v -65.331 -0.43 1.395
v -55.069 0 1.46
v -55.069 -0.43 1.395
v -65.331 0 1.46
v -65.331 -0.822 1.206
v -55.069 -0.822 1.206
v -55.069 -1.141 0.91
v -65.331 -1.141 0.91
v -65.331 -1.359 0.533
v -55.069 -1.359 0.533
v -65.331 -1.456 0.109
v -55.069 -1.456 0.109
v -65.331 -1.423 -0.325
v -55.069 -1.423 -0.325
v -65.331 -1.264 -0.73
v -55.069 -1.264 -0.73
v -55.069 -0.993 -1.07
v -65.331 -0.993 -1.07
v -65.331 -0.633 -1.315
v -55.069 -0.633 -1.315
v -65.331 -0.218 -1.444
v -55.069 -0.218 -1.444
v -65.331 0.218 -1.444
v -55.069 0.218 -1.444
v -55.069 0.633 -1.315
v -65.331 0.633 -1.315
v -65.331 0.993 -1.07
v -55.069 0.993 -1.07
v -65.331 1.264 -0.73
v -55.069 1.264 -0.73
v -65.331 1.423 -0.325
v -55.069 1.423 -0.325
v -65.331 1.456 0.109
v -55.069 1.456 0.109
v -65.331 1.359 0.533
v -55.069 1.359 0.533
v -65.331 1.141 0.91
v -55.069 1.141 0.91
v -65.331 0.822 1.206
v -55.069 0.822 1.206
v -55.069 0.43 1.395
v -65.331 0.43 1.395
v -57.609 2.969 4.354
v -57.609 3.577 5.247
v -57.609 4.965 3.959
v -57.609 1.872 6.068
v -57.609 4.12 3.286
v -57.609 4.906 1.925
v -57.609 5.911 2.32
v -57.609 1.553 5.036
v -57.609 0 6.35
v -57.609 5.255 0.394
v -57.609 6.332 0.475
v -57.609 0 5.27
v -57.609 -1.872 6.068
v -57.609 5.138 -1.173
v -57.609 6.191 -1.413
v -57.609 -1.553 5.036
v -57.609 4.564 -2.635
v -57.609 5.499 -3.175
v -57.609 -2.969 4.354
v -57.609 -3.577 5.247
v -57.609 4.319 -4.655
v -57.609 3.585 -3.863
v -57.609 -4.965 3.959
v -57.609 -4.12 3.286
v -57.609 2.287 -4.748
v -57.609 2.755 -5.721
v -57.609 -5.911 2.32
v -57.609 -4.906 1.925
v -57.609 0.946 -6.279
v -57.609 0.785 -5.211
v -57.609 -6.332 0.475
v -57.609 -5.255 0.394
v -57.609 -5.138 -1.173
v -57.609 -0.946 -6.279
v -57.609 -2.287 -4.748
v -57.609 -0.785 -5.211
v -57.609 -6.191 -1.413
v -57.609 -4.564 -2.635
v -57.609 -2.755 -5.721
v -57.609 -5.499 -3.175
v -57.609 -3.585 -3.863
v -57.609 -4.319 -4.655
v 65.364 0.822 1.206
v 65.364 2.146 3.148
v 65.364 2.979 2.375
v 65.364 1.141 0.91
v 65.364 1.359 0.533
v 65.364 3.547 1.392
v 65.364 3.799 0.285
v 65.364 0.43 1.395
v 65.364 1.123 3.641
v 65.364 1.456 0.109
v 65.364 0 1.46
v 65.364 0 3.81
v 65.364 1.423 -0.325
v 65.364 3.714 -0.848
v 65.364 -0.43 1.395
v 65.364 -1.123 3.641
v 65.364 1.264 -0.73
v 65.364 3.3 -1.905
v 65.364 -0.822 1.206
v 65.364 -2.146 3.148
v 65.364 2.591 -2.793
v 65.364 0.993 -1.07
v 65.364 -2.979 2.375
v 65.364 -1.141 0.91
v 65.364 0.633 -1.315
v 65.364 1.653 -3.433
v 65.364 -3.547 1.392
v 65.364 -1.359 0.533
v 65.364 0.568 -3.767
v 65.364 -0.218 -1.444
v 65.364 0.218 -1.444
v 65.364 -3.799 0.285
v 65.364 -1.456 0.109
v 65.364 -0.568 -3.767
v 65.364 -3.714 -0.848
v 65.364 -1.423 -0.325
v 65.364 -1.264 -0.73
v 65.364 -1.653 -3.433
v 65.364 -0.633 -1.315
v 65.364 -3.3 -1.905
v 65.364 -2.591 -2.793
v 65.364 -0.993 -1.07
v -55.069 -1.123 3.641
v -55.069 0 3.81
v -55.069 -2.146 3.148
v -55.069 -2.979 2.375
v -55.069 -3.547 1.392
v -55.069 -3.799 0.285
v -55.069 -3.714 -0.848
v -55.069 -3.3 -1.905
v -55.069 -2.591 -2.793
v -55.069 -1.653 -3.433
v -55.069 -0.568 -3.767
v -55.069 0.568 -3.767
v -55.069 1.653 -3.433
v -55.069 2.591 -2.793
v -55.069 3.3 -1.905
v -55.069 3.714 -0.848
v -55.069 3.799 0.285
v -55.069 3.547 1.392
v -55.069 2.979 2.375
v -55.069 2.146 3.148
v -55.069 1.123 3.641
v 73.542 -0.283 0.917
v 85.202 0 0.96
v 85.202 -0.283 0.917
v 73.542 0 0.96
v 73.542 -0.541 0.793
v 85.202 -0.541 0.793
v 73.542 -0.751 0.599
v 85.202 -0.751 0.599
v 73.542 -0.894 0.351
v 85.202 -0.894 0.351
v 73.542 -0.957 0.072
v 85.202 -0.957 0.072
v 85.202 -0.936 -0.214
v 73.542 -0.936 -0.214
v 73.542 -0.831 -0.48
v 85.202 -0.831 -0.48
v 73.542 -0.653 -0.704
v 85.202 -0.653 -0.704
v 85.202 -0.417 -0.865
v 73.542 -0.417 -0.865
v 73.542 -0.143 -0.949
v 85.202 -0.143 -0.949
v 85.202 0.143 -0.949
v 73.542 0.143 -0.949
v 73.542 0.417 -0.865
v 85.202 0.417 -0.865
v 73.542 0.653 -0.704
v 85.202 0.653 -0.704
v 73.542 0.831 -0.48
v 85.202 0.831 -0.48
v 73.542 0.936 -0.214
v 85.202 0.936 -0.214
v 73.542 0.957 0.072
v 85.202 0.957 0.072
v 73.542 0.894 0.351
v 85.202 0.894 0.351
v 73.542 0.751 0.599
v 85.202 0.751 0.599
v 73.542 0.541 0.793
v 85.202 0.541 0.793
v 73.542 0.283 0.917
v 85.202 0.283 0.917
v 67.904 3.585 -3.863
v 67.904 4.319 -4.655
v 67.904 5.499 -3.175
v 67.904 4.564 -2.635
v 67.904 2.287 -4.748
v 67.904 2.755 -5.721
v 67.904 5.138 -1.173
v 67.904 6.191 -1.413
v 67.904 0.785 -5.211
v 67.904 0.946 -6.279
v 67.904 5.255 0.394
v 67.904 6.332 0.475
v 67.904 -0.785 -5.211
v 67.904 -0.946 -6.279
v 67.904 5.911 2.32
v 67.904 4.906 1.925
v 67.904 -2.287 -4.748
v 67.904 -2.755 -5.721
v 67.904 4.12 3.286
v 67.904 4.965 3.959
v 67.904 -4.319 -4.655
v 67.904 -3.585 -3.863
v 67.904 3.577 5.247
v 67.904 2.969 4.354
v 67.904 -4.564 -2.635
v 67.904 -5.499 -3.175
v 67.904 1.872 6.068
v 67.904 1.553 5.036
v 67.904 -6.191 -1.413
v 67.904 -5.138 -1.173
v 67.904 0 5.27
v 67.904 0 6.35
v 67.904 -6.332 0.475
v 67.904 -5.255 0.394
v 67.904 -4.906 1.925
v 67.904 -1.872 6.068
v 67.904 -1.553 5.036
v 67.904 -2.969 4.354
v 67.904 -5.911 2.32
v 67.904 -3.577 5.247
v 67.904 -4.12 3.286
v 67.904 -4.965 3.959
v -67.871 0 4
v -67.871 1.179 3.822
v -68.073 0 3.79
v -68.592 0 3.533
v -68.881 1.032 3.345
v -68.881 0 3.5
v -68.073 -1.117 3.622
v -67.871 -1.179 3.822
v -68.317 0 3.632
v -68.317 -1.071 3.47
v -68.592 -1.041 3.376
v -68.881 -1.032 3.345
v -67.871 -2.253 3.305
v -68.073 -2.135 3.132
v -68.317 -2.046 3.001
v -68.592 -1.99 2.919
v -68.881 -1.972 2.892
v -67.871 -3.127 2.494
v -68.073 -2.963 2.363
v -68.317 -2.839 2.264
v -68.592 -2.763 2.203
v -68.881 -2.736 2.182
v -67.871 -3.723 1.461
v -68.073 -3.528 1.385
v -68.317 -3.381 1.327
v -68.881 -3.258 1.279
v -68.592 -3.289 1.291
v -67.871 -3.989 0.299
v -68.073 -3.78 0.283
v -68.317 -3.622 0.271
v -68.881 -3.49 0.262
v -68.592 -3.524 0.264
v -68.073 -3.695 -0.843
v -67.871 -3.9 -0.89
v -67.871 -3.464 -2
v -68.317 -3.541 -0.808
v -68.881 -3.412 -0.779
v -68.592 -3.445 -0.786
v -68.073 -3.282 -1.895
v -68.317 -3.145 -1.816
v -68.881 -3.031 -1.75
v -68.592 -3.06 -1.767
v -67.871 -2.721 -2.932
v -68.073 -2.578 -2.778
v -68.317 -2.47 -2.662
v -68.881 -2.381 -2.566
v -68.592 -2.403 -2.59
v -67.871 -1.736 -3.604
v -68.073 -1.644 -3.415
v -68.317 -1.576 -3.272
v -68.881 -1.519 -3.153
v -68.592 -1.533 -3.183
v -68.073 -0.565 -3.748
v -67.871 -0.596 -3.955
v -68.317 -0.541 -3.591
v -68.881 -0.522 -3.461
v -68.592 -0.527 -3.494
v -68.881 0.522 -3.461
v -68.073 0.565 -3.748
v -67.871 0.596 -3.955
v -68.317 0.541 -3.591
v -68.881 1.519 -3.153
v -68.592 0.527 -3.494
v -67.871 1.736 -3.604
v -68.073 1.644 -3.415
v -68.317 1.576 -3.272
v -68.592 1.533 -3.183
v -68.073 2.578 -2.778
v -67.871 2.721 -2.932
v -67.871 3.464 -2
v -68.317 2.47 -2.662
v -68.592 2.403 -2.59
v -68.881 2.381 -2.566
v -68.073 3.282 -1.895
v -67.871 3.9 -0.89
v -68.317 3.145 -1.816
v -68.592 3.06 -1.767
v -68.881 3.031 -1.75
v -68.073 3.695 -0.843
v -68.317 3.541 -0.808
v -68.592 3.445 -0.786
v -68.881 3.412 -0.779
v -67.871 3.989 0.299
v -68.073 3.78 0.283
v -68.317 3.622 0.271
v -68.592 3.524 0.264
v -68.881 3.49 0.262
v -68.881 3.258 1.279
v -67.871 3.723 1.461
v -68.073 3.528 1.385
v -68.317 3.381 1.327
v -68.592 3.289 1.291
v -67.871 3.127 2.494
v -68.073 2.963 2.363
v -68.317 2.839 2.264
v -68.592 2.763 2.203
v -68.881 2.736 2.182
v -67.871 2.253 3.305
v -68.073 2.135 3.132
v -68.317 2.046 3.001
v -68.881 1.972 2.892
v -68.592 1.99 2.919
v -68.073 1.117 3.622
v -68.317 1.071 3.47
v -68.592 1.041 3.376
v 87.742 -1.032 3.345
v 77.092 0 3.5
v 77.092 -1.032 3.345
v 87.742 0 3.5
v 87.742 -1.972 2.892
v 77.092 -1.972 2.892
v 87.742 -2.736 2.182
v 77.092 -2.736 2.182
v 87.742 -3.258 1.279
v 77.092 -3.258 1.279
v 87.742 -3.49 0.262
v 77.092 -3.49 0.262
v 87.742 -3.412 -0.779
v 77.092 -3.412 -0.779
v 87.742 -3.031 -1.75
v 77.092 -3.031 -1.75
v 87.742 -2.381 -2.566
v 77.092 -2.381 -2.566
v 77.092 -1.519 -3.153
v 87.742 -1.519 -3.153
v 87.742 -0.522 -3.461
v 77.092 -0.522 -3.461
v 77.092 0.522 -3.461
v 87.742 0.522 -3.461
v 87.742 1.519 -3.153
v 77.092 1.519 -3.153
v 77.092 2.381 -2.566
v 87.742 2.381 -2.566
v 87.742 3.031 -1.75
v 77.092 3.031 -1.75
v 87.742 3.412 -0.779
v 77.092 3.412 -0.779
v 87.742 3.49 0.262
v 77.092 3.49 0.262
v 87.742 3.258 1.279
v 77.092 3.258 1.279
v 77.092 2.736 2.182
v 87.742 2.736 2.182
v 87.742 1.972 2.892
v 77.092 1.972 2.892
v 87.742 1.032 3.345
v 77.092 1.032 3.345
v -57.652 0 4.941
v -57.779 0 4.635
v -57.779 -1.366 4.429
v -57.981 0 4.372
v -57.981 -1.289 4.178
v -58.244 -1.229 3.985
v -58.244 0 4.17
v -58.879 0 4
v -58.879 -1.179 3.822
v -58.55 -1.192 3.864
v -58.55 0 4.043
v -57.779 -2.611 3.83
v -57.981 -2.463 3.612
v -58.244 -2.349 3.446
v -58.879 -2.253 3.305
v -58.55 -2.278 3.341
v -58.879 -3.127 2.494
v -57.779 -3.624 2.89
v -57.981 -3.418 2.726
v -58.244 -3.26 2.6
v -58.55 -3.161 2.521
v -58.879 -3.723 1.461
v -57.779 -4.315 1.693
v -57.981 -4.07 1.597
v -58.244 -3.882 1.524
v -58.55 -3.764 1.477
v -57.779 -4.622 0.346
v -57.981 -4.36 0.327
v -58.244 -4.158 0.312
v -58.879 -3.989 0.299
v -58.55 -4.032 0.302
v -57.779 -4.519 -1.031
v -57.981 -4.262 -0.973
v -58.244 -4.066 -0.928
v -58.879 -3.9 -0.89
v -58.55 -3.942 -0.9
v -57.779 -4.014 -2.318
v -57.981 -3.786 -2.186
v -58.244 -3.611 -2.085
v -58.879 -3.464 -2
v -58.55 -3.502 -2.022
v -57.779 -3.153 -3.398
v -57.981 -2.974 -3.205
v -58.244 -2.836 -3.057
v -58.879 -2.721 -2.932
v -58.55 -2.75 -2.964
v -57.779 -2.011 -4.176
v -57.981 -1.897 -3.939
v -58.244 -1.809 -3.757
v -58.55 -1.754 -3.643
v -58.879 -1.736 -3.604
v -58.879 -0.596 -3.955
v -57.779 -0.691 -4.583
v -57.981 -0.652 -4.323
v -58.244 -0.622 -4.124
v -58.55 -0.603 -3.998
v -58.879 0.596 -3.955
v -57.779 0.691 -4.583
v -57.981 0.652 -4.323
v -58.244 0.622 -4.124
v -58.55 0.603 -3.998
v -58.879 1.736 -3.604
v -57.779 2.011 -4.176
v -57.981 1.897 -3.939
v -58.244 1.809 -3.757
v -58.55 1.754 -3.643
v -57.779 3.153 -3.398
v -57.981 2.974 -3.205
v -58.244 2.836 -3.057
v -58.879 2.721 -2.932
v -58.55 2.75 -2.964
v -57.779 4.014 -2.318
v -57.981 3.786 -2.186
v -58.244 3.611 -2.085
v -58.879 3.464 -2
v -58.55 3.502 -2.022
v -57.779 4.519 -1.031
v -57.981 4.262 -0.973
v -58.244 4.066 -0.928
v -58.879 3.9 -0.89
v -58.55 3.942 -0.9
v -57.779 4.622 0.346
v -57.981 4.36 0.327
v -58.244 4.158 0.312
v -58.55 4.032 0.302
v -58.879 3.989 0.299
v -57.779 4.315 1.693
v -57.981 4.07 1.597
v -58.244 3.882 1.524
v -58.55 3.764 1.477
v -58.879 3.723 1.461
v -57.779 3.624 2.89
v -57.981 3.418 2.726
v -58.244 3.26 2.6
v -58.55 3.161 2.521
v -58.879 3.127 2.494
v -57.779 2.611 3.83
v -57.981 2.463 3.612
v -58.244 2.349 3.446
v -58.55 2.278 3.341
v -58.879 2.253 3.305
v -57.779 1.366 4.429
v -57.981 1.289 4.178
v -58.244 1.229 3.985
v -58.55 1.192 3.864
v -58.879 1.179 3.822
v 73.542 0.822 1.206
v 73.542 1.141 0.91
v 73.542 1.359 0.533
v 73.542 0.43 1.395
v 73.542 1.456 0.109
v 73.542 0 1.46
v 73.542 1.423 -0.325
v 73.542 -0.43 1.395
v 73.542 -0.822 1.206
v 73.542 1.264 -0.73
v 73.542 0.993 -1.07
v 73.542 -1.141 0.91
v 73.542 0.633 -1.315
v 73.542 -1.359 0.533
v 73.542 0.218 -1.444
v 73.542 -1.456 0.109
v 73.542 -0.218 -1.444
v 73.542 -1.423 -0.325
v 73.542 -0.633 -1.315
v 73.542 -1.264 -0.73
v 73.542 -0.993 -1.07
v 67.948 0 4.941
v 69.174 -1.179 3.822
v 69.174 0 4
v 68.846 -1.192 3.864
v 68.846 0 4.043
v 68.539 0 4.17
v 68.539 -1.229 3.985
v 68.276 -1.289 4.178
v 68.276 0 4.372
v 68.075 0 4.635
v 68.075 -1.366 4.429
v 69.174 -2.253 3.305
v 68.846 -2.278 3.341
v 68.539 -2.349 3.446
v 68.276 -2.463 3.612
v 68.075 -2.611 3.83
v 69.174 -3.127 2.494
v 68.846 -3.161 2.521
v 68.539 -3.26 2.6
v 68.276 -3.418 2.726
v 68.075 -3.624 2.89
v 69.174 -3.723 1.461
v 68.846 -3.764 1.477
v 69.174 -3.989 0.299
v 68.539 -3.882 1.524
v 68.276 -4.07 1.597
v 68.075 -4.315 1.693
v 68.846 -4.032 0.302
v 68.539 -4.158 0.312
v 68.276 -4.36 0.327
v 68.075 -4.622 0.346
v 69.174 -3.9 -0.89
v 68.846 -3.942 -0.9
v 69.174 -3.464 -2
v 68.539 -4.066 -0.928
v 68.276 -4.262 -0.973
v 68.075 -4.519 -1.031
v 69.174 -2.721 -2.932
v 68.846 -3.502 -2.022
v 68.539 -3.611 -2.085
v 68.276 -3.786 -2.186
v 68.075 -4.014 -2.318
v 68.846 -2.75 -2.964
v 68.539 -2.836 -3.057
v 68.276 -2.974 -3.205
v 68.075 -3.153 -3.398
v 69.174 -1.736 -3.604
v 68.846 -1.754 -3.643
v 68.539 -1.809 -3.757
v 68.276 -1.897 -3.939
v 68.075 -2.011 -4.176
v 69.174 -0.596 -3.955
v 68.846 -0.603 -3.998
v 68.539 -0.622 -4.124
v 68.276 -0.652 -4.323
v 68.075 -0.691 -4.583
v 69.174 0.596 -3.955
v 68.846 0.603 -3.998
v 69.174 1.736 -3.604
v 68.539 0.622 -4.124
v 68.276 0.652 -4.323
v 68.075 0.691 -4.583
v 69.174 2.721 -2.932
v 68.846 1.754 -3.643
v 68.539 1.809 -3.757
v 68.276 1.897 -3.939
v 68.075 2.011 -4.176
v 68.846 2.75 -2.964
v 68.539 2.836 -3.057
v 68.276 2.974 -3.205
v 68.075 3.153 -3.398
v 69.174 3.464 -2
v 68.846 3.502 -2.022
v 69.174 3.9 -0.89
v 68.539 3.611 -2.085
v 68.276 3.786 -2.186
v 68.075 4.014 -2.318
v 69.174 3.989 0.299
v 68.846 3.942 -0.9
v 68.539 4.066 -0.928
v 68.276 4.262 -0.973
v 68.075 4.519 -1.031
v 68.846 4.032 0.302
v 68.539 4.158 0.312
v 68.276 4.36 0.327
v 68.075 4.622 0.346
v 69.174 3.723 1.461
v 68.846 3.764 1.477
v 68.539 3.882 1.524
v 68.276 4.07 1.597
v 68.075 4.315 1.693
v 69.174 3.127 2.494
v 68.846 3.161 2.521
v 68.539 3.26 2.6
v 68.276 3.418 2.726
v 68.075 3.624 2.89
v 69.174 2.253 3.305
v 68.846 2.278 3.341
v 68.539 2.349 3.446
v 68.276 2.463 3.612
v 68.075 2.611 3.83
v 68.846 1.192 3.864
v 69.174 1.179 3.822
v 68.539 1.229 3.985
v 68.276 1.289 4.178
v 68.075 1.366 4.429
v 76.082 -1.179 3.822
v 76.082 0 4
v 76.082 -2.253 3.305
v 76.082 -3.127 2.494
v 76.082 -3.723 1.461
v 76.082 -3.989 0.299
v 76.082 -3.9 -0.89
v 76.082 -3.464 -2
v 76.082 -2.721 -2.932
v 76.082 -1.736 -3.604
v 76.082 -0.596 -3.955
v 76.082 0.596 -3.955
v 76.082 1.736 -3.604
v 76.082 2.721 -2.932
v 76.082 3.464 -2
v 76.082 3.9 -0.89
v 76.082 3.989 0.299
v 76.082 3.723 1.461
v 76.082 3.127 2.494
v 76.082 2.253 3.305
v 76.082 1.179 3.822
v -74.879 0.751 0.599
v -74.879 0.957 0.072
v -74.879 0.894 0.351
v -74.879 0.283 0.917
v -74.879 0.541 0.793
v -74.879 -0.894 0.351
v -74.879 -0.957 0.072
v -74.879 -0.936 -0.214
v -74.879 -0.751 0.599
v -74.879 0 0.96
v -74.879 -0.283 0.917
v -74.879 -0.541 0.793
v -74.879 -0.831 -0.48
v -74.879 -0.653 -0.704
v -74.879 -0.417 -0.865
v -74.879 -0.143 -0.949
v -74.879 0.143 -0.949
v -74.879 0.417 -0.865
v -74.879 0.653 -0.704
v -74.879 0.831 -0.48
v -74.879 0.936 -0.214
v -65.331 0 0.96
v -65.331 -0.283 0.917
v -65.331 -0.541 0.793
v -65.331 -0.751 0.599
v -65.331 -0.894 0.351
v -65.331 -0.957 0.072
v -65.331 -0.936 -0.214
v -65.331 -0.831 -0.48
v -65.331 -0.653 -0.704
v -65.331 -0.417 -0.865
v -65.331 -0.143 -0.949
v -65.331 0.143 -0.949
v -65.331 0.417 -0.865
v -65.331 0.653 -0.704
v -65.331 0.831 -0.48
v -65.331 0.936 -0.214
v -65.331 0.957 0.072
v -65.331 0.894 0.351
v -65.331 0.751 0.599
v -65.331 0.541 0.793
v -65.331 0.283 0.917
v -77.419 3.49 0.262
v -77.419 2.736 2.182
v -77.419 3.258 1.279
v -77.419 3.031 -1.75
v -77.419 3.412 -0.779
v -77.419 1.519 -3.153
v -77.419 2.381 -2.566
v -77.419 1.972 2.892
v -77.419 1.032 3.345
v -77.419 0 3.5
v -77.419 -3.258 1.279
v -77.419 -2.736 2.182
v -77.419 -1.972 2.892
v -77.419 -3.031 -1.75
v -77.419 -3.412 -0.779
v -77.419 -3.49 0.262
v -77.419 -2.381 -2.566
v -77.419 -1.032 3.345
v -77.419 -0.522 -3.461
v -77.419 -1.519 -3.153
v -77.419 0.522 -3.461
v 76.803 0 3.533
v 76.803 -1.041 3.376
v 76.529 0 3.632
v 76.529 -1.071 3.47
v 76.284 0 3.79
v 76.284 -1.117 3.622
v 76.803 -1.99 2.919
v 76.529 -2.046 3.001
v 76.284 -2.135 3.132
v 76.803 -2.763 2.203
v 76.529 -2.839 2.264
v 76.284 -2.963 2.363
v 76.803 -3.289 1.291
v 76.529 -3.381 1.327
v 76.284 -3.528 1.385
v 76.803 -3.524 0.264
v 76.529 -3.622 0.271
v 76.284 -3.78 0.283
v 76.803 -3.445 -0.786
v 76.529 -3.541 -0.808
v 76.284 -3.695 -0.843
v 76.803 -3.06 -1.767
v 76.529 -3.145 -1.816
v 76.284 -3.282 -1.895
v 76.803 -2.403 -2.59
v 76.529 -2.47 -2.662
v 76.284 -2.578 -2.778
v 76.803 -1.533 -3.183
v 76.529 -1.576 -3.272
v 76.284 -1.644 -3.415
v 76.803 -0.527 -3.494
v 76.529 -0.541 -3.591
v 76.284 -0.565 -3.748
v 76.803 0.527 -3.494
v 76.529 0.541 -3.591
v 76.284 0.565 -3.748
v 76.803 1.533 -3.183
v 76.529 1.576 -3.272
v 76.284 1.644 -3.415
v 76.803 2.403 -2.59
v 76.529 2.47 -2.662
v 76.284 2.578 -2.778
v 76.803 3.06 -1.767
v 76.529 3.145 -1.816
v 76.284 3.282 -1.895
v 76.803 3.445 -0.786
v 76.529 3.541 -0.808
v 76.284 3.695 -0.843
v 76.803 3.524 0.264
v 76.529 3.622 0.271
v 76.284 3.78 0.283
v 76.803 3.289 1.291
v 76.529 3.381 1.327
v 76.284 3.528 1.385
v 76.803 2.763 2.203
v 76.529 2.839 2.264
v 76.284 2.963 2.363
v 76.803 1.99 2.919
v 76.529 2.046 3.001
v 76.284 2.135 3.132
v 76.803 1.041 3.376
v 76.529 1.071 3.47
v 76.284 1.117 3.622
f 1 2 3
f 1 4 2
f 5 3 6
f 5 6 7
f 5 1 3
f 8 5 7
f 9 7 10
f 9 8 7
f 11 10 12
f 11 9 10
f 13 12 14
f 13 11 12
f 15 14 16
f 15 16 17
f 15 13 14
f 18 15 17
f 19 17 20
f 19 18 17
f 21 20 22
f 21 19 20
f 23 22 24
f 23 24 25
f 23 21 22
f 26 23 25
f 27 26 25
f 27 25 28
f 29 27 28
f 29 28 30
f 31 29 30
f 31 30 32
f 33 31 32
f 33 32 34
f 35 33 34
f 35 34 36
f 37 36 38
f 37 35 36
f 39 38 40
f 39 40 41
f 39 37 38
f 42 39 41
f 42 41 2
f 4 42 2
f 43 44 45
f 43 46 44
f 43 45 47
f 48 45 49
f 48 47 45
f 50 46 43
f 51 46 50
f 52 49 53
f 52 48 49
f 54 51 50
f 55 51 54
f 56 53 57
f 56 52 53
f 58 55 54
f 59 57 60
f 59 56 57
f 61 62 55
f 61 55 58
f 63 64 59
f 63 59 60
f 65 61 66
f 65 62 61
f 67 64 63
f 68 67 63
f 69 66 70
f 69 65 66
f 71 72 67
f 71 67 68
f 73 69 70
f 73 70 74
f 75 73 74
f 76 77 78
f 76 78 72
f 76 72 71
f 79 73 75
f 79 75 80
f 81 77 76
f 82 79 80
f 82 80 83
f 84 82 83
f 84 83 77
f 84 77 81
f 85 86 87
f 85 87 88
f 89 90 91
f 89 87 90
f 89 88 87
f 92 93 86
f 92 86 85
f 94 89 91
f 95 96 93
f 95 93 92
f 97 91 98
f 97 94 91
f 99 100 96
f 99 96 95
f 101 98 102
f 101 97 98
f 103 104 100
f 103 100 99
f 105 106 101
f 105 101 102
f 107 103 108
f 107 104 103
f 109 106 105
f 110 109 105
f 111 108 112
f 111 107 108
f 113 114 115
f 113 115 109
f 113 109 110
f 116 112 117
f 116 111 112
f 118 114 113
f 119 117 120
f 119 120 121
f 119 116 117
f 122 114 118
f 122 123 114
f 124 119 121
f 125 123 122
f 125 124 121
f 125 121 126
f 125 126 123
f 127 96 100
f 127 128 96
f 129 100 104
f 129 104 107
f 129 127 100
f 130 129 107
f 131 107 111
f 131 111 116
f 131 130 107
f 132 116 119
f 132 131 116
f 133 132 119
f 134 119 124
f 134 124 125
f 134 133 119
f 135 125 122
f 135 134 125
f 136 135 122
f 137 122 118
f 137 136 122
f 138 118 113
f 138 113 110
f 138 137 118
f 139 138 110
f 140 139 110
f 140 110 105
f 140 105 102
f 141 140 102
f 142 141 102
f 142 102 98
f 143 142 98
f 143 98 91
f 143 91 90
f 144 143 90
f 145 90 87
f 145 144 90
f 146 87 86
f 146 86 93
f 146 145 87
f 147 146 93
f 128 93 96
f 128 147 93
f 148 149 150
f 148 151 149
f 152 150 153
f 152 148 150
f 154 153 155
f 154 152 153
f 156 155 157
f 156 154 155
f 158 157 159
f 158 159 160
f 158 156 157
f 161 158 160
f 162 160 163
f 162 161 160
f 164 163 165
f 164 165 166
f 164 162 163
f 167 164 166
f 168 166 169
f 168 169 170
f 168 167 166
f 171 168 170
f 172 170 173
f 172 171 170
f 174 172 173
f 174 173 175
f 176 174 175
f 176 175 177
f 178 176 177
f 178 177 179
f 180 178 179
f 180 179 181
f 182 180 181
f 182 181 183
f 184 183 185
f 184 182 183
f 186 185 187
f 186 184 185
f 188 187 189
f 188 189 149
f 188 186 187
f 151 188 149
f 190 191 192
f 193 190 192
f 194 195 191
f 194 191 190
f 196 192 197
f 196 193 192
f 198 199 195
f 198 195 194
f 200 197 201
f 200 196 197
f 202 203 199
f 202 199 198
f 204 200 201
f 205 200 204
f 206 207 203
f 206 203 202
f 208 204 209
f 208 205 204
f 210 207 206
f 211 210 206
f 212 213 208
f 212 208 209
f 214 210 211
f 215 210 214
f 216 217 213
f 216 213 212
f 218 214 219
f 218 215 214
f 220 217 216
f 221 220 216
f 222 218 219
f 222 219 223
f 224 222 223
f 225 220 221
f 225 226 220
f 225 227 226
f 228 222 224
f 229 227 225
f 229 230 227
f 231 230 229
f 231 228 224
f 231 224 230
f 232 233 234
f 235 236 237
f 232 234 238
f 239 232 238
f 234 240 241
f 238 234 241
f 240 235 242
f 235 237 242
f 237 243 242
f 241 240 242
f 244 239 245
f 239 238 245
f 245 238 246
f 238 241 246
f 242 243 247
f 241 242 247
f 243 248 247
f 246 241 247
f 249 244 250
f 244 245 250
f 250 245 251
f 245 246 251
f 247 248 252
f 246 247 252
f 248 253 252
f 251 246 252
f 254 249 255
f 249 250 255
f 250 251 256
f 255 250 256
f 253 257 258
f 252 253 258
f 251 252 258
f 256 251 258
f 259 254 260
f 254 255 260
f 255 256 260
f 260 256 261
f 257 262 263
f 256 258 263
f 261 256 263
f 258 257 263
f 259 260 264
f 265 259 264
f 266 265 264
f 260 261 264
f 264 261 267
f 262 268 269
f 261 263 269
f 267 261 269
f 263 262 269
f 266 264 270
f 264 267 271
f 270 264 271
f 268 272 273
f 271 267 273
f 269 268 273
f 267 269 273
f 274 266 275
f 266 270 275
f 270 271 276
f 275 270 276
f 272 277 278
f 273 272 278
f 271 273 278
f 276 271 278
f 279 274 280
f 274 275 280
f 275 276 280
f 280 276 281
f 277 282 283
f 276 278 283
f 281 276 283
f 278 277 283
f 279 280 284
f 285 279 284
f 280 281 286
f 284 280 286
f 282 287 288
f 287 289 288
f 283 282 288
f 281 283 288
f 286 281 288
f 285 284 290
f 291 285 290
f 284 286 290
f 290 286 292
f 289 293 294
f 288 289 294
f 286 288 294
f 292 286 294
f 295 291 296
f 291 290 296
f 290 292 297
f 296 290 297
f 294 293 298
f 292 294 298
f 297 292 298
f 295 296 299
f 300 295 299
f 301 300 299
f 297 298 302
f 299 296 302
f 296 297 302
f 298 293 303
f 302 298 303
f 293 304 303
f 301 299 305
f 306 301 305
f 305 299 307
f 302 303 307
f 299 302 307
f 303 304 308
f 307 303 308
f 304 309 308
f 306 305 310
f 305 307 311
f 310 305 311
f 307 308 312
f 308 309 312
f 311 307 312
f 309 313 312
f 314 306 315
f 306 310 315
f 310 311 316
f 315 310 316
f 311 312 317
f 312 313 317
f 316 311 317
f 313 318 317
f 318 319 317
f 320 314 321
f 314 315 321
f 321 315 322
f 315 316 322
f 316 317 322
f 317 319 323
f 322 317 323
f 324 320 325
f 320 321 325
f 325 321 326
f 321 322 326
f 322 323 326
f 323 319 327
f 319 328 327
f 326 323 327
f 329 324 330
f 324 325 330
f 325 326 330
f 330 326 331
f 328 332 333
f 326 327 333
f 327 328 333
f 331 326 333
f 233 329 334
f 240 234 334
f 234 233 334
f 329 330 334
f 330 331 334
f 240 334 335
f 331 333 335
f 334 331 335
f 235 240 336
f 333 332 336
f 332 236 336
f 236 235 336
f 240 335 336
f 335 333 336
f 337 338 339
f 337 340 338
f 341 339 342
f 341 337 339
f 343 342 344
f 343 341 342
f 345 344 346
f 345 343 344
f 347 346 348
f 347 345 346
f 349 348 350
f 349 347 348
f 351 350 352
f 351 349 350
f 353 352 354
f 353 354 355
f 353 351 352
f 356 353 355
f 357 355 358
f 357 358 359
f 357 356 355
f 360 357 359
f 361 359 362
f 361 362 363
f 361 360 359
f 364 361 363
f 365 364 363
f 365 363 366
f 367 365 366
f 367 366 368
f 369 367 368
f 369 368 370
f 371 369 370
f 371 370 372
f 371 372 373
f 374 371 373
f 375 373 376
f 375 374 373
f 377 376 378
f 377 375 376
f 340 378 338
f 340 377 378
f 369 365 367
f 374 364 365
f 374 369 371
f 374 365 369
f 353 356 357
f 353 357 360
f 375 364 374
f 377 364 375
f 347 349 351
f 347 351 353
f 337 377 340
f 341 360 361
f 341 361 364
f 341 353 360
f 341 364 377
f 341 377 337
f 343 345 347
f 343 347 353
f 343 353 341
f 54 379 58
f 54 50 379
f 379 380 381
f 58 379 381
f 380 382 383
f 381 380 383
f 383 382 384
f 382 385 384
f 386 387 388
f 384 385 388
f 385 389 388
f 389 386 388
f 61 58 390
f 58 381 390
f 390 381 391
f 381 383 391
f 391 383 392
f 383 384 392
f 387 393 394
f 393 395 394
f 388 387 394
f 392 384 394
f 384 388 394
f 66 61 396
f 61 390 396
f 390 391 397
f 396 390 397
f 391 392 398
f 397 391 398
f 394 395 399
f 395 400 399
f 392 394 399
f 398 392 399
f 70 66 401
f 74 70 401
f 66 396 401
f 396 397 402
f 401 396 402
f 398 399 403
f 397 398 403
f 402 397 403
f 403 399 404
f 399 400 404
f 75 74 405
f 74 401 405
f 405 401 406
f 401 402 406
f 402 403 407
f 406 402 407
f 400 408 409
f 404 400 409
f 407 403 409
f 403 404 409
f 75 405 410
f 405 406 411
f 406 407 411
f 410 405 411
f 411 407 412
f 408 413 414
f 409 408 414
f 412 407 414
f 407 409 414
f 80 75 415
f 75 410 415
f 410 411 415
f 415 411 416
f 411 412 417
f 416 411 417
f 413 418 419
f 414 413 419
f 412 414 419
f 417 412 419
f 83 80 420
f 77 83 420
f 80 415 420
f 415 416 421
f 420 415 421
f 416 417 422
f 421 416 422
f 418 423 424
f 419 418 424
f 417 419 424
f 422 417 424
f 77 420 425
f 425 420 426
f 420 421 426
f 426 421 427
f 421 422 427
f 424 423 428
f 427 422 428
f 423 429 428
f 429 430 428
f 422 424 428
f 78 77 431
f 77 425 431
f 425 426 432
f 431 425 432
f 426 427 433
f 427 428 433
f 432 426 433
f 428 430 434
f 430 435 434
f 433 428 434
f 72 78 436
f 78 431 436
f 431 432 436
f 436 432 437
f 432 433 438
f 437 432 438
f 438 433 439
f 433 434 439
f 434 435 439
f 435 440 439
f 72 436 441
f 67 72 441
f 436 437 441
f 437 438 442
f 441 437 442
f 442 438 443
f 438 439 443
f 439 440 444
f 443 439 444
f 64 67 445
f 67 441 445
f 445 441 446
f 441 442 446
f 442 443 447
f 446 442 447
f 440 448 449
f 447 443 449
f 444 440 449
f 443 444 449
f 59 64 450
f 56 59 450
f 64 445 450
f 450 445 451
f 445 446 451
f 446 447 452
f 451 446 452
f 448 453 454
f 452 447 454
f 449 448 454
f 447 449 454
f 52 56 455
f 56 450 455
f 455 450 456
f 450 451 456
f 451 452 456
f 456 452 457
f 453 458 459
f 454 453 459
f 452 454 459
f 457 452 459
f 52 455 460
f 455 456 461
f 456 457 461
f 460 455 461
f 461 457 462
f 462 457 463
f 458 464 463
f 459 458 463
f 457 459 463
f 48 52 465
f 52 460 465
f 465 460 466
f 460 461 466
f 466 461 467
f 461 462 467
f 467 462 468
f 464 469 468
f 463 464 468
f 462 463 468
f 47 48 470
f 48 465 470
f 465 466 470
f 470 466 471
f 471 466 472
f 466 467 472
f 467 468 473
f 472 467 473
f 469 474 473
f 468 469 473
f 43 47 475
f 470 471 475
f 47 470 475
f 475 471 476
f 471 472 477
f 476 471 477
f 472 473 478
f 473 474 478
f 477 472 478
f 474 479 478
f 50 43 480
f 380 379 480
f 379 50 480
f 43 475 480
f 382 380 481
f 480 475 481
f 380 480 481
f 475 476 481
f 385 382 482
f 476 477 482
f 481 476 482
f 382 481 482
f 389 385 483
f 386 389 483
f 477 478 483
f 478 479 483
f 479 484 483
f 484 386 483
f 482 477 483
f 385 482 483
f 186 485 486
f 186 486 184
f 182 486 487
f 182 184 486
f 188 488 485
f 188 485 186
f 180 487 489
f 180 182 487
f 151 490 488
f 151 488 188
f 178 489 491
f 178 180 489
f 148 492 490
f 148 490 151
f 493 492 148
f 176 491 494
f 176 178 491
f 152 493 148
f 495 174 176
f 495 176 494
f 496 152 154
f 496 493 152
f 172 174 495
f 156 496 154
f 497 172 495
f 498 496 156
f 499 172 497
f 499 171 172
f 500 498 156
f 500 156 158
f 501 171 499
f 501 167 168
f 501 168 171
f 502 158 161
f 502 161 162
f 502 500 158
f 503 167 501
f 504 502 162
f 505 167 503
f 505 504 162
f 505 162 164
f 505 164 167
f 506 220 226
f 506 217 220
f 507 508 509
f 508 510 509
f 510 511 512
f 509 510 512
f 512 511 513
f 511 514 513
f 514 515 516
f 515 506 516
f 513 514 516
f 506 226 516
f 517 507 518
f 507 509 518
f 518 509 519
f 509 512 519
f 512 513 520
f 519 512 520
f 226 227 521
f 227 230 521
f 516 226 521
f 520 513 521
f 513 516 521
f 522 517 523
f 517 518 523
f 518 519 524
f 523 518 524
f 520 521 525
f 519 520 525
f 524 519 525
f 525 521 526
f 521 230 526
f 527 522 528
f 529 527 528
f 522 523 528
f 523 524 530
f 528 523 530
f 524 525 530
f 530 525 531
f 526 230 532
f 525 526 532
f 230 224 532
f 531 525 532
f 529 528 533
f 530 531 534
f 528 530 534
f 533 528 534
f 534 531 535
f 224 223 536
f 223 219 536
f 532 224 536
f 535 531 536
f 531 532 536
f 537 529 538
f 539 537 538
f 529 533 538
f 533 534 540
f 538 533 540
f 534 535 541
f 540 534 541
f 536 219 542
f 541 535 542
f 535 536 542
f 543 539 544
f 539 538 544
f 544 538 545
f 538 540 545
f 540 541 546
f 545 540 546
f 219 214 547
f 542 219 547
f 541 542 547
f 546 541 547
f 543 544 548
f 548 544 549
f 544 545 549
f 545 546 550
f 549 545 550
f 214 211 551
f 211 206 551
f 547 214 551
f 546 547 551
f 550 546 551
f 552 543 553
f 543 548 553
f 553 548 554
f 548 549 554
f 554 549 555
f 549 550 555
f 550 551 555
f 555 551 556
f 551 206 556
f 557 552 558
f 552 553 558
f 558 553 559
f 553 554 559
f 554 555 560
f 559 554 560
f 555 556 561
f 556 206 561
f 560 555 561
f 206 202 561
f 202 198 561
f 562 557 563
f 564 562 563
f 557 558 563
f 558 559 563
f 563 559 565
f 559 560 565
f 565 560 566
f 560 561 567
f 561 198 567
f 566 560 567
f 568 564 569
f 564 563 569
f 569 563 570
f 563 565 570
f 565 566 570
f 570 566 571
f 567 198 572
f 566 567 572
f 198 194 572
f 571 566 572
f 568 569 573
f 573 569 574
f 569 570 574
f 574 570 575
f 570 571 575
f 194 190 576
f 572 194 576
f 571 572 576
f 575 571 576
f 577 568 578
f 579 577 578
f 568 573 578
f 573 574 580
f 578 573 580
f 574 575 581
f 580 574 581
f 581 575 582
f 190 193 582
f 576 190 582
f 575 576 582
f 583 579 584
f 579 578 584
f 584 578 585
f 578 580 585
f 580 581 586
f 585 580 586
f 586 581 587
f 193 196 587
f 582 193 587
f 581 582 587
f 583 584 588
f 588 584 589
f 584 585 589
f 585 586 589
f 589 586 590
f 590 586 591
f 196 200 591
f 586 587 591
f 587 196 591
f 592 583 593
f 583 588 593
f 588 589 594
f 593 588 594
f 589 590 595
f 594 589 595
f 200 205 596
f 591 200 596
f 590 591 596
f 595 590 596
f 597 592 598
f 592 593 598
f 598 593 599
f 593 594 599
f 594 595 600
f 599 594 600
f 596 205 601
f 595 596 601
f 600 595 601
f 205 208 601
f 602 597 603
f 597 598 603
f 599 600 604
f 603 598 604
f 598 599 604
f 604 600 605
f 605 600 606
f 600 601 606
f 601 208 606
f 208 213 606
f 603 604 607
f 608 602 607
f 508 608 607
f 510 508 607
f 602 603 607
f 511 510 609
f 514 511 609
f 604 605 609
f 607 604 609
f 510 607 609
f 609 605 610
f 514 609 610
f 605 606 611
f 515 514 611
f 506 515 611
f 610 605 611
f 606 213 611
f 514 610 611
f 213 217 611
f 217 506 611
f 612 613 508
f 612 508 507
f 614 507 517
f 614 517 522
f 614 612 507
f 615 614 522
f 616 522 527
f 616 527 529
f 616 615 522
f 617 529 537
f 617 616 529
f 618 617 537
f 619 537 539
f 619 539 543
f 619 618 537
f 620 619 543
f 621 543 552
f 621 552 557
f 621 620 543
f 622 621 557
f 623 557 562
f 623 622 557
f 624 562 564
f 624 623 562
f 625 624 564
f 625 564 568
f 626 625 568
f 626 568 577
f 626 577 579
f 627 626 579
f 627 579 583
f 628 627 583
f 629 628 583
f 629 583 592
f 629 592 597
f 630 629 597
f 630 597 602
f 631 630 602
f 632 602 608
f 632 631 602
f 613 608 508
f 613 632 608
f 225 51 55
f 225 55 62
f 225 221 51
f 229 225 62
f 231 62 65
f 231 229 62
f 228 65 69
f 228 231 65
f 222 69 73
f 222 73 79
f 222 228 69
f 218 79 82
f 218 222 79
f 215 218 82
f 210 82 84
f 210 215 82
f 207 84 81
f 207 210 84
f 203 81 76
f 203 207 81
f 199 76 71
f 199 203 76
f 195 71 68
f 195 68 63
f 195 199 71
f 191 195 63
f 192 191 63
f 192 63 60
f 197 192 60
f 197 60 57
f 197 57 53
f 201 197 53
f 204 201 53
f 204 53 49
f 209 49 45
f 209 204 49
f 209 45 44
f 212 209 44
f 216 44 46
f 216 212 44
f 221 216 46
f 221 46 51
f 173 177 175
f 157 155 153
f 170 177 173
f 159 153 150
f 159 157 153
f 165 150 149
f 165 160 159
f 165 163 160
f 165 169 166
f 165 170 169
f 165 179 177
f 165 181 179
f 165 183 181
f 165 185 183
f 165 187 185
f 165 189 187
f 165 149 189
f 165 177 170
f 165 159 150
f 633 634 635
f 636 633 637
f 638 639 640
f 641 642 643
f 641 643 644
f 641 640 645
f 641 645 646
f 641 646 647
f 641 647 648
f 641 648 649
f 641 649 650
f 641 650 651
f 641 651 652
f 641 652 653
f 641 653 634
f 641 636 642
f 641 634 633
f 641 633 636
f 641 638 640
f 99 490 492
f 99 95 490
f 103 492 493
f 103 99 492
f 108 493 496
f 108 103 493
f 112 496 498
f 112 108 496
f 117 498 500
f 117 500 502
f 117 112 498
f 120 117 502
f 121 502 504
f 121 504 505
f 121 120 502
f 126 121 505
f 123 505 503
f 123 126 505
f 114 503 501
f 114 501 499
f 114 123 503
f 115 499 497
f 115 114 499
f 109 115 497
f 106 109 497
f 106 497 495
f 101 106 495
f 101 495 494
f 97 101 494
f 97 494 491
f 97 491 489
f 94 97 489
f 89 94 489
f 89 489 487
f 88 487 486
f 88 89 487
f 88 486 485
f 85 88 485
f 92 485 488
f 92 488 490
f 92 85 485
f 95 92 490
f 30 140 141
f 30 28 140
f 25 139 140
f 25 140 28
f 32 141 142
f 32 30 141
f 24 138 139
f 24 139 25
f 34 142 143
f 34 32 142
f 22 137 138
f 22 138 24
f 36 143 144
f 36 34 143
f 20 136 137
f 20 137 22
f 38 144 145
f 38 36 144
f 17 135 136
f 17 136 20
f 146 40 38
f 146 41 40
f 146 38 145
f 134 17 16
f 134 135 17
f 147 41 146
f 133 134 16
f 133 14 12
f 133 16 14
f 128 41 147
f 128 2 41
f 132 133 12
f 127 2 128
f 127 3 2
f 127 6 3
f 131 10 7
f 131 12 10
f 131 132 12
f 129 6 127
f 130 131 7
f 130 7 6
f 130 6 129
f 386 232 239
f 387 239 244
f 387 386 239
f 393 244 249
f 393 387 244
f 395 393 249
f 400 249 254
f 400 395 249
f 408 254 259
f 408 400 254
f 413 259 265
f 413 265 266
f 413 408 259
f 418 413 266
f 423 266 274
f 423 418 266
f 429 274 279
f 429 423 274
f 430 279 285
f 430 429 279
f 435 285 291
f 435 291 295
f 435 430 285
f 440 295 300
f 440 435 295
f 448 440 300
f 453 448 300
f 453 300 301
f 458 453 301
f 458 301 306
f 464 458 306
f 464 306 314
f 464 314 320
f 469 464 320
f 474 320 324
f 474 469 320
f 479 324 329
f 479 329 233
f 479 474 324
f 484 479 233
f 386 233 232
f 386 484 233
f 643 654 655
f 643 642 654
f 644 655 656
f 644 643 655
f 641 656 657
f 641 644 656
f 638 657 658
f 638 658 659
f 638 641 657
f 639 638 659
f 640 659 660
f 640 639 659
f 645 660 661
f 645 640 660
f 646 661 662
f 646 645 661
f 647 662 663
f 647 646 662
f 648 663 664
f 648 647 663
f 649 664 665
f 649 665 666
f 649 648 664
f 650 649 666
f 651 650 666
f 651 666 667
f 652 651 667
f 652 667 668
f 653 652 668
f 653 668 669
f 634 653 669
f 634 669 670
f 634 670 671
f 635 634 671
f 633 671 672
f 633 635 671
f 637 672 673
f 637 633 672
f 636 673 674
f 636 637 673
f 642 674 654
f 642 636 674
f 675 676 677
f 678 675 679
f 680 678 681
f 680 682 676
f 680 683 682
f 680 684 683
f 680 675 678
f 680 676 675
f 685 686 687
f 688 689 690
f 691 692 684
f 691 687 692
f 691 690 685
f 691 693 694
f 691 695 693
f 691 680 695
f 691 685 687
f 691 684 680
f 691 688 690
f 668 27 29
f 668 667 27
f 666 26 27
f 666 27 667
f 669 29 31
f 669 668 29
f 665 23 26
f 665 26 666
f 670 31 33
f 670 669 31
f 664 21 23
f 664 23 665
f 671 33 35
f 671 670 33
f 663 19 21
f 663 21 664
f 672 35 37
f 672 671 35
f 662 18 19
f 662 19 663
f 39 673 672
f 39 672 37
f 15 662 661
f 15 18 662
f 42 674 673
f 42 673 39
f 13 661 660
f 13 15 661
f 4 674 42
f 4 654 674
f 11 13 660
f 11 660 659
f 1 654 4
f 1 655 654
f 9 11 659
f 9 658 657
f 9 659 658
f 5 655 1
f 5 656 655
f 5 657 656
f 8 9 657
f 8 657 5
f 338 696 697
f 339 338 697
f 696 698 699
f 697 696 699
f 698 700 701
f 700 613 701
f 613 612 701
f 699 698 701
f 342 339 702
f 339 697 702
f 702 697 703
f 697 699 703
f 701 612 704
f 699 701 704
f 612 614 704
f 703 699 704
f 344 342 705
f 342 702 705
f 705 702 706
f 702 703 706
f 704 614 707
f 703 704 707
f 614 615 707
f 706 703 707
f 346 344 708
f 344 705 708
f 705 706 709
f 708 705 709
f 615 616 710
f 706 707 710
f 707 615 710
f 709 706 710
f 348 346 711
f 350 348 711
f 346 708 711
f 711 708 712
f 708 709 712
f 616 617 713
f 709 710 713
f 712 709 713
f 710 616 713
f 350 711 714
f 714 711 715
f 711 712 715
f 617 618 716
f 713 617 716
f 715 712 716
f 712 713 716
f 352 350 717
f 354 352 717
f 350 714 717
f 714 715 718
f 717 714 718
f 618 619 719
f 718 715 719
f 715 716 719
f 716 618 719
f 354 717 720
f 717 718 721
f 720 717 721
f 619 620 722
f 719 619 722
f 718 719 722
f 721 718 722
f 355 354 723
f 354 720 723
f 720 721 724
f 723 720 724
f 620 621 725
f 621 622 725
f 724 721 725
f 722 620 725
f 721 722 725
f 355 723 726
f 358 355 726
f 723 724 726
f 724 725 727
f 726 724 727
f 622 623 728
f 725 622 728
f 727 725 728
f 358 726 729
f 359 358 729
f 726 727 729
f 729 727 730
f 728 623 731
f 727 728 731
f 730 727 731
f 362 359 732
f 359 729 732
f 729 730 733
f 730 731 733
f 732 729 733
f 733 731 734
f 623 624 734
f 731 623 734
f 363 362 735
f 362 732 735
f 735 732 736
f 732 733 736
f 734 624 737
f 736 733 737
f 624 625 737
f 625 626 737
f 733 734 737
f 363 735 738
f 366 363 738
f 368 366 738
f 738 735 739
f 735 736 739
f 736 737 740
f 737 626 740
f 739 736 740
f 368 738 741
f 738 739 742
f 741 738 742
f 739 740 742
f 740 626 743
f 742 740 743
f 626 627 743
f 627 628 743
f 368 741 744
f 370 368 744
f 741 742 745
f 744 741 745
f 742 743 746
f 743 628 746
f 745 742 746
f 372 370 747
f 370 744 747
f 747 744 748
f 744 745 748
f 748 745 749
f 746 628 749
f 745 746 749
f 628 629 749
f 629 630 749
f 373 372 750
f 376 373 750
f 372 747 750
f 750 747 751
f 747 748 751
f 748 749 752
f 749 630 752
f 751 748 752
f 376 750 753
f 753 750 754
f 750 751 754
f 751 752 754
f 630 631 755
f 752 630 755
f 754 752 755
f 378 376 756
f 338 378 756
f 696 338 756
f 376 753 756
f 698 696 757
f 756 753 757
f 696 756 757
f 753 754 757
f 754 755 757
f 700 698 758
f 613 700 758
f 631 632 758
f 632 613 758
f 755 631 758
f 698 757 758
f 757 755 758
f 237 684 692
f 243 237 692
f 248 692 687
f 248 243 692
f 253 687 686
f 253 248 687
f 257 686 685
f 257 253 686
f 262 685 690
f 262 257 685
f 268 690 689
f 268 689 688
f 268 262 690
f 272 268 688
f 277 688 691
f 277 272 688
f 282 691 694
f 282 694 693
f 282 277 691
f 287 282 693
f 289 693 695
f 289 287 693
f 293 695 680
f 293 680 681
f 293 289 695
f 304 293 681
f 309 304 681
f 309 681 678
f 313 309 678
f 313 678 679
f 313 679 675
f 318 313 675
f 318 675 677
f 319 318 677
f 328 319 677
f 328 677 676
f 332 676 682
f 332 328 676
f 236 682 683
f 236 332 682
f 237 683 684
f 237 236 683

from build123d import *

# Parameters (mm, degrees)
FILLET1_R = 1.27


with BuildPart() as part:
    # Sketch1 → Revolve-Thin1 (revolve)
    with BuildSketch(Plane(origin=(0, 0, 0), x_dir=(1, 0, 0), z_dir=(0, 1, 0)), mode=Mode.PRIVATE) as revolve_thin1_sk:
        Polygon((-77.419354839, 0), (-77.419354839, 3.5), (-67.870967742, 3.5), (-67.870967742, 4), (-57.608712258, 4), (-57.608712258, 6.35), (67.904423226, 6.35), (67.904423226, 4), (76.082332903, 4), (76.082332903, 3.5), (87.741935484, 3.5), (87.741935484, 0), (85.201935484, 0), (85.201935484, 0.96), (73.542332903, 0.96), (73.542332903, 1.46), (65.364423226, 1.46), (65.364423226, 3.81), (-55.068712258, 3.81), (-55.068712258, 1.46), (-65.330967742, 1.46), (-65.330967742, 0.96), (-74.879354839, 0.96), (-74.879354839, 0), align=None)
    revolve(revolve_thin1_sk.sketch.rotate(Axis((-77.419354839, 0, 0), (1, 0, 0)), 180), axis=Axis((-77.419354839, 0, 0), (1, 0, 0)))

    # Fillet1
    # the kernel refuses this fillet: 1.27 mm, written as the material it adds along each edge
    with BuildSketch(Plane(origin=(-67.870967742, 0, 0), x_dir=(0, 0, 1), z_dir=(0, 1, 0))) as fillet1_piece_1:
        with BuildLine():
            CenterArc((4.77, -1.009950494), FILLET1_R, 127.322390296, 52.677609704)
            Line((4, 0), (3.9846, 0.02019901))
            ThreePointArc((3.9846, 0.02019901), (3.75, 0.0254), (3.5, 0.0254))
            Line((3.5, 0.0254), (3.4746, 0))
            Line((3.4746, 0), (3.4746, -1.009950494))
            Line((3.4746, -1.009950494), (3.5, -1.009950494))
        make_face()
    revolve(axis=Axis((-67.870967742, 0, 0), (1, 0, 0)))
    with BuildSketch(Plane(origin=(-57.608712258, 0, 0), x_dir=(0, 0, 1), z_dir=(0, 1, 0))) as fillet1_piece_2:
        with BuildLine():
            CenterArc((4 + FILLET1_R, -FILLET1_R), FILLET1_R, 90, 90)
            Line((4 + FILLET1_R, 0), (4 + FILLET1_R, FILLET1_R * 0.02))
            Line((4 + FILLET1_R, FILLET1_R * 0.02), (4 - FILLET1_R * 0.02, FILLET1_R * 0.02))
            Line((4 - FILLET1_R * 0.02, FILLET1_R * 0.02), (4 - FILLET1_R * 0.02, -FILLET1_R))
            Line((4 - FILLET1_R * 0.02, -FILLET1_R), (4, -FILLET1_R))
        make_face()
    revolve(axis=Axis((-57.608712258, 0, 0), (1, 0, 0)))
    with BuildSketch(Plane(origin=(67.904423226, 0, 0), x_dir=(0, 0, 1), z_dir=(0, 1, 0))) as fillet1_piece_3:
        with BuildLine():
            CenterArc((4 + FILLET1_R, FILLET1_R), FILLET1_R, 180, 90)
            Line((4, FILLET1_R), (4 - FILLET1_R * 0.02, FILLET1_R))
            Line((4 - FILLET1_R * 0.02, FILLET1_R), (4 - FILLET1_R * 0.02, -FILLET1_R * 0.02))
            Line((4 - FILLET1_R * 0.02, -FILLET1_R * 0.02), (4 + FILLET1_R, -FILLET1_R * 0.02))
            Line((4 + FILLET1_R, -FILLET1_R * 0.02), (4 + FILLET1_R, 0))
        make_face()
    revolve(axis=Axis((67.904423226, 0, 0), (1, 0, 0)))
    with BuildSketch(Plane(origin=(76.082332903, 0, 0), x_dir=(0, 0, 1), z_dir=(0, 1, 0))) as fillet1_piece_4:
        with BuildLine():
            CenterArc((4.77, 1.009950494), FILLET1_R, 180, 52.677609704)
            Line((3.5, 1.009950494), (3.4746, 1.009950494))
            Line((3.4746, 1.009950494), (3.4746, 0))
            Line((3.4746, 0), (3.5, -0.0254))
            ThreePointArc((3.5, -0.0254), (3.75, -0.0254), (3.9846, -0.02019901))
            Line((3.9846, -0.02019901), (4, 0))
        make_face()
    revolve(axis=Axis((76.082332903, 0, 0), (1, 0, 0)))


solid = part.part
